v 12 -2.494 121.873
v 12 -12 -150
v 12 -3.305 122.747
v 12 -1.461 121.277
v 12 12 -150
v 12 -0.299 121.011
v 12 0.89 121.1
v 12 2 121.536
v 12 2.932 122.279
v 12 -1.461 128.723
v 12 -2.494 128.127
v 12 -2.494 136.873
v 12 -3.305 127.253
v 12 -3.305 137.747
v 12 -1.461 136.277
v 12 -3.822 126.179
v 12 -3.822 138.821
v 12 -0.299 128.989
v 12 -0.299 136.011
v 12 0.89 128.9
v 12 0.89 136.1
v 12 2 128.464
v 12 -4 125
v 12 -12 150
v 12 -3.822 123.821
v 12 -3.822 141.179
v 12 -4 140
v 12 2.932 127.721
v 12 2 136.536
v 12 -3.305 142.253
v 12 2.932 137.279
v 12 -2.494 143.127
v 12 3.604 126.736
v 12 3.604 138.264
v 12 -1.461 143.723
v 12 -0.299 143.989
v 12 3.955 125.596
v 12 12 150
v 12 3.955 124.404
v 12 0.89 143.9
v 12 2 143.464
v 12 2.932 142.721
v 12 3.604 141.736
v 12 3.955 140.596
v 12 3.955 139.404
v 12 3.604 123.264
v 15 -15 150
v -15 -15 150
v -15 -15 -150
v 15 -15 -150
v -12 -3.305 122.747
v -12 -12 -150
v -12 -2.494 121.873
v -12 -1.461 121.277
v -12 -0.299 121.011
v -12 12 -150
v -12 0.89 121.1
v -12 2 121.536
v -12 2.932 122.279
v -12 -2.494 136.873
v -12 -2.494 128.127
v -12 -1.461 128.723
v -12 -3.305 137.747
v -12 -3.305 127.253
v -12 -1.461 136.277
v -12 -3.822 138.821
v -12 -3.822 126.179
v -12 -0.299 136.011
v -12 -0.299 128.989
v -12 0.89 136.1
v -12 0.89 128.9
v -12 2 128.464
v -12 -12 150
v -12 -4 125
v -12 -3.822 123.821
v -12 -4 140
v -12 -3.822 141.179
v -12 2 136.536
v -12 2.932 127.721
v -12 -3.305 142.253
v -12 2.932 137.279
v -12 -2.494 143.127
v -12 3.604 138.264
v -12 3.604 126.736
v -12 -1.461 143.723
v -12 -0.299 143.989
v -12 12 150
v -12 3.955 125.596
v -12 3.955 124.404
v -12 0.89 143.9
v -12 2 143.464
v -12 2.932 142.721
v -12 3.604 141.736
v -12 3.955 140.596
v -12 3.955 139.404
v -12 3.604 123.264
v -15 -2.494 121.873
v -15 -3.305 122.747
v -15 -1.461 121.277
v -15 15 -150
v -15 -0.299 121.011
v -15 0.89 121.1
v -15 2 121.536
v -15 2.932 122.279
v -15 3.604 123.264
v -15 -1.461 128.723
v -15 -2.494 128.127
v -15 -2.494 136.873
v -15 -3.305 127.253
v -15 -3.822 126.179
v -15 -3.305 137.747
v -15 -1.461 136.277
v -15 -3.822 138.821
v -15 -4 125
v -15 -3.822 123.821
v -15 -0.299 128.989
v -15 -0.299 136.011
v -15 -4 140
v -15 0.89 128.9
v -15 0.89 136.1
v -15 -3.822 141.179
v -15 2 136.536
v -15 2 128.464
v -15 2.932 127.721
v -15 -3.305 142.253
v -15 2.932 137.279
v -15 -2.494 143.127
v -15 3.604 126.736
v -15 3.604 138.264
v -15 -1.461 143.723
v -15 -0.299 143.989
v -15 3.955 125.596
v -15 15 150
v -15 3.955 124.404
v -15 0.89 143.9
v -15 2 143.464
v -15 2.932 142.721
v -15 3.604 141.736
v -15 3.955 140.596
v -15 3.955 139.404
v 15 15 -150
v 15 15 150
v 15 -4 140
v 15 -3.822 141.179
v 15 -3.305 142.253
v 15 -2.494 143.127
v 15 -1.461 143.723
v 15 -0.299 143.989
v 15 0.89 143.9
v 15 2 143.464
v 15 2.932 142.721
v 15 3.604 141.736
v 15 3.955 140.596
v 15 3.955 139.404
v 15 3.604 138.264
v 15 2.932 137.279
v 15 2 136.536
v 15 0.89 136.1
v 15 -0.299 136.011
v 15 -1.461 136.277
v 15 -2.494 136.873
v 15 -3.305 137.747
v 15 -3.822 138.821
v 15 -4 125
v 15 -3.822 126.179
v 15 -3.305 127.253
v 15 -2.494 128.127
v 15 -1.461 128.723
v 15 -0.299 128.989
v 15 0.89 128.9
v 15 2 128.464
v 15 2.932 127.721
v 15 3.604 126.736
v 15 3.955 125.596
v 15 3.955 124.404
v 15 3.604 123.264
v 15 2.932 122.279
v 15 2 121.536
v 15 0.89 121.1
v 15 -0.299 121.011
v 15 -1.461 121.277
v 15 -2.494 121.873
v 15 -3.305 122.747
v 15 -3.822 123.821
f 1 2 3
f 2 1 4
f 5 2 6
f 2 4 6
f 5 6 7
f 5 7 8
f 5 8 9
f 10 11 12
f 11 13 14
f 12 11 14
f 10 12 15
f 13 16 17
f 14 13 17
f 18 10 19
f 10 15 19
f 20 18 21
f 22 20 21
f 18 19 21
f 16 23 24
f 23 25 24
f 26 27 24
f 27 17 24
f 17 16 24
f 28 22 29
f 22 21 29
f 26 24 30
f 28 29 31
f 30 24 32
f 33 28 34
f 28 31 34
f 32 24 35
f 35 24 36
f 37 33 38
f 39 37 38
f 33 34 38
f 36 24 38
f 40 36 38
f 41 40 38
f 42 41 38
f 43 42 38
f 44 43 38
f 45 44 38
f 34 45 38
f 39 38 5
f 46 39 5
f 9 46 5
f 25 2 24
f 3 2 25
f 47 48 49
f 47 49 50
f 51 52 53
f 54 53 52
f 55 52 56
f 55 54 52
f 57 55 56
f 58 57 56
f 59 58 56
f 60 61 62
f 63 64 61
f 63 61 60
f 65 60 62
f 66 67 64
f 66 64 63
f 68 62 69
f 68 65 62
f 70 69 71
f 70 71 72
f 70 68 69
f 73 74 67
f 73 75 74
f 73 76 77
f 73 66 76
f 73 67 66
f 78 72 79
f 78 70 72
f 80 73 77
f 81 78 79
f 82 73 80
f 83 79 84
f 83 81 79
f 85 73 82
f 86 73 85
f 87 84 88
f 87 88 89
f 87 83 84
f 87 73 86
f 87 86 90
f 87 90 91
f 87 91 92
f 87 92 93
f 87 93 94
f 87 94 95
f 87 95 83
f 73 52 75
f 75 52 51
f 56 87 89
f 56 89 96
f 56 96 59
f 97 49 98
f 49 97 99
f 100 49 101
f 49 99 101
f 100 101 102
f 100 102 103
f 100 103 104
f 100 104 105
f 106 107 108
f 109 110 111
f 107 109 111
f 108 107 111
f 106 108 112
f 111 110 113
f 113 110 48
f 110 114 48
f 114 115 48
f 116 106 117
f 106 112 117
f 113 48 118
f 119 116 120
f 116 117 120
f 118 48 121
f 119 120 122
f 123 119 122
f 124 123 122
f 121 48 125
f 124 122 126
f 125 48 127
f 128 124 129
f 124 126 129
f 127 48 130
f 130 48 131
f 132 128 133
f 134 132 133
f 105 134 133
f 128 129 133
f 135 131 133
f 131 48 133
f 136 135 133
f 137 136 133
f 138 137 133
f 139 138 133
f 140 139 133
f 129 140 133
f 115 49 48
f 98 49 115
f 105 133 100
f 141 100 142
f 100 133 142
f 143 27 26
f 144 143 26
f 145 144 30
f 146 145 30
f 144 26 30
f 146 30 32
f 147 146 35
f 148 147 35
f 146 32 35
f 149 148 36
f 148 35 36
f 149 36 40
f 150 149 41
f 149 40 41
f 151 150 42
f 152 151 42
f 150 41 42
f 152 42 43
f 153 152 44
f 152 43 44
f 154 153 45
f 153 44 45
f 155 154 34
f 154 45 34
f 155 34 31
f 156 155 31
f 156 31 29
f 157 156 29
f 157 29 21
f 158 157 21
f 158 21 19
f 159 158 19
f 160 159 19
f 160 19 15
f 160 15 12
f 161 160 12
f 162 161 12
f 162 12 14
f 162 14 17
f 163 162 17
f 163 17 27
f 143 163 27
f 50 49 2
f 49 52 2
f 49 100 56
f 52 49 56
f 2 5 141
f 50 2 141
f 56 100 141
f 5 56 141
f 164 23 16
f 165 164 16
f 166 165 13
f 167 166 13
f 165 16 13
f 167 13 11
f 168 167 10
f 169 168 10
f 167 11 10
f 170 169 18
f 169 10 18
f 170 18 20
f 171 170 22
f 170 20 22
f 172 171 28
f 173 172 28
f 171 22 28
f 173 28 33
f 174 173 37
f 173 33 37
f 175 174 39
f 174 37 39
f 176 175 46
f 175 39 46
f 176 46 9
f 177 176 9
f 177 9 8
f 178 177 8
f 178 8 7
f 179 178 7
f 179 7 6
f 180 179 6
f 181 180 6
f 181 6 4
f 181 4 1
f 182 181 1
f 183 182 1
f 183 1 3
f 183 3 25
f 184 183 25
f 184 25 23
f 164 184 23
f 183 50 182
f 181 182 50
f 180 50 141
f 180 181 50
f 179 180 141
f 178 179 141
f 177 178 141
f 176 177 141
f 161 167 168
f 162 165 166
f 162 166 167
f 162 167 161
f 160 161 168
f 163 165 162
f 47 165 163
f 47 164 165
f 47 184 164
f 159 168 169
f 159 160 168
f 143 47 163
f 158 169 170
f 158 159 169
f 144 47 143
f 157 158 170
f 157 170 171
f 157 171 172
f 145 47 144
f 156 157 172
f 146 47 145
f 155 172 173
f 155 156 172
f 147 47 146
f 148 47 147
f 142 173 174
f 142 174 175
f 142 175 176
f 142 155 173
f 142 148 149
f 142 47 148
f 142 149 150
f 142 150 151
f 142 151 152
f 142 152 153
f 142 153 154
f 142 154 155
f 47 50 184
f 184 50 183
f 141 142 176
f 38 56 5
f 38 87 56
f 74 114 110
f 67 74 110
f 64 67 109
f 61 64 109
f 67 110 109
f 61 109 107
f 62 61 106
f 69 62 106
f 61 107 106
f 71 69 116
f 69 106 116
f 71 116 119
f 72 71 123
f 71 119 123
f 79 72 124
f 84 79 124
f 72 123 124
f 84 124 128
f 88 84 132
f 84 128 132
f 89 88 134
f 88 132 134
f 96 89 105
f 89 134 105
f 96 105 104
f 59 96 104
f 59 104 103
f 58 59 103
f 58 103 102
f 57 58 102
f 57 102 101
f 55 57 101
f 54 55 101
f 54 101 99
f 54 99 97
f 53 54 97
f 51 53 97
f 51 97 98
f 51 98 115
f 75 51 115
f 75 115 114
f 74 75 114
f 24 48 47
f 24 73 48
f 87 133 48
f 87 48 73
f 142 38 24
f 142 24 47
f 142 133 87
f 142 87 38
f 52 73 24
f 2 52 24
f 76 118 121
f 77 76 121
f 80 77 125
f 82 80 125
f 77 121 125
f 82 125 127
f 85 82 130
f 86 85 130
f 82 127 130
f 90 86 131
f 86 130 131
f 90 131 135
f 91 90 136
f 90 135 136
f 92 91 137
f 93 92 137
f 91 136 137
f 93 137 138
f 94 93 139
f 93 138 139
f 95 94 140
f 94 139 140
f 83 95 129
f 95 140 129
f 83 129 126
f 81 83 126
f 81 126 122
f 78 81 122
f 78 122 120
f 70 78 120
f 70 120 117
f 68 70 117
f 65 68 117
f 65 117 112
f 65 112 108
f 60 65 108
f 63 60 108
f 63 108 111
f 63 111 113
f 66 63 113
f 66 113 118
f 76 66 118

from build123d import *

# Parameters (mm, degrees)
F0_W     = 30
F0_H     = 30
F0_W_2   = 24
F0_H_2   = 24
F1_DEPTH = 150
F3_D     = 8


with BuildPart() as f1:
    # F0 (on Top) → F1 (new body, symmetric)
    with BuildSketch(Plane.XY):
        Rectangle(F0_W, F0_H)
        Rectangle(F0_W_2, F0_H_2, mode=Mode.SUBTRACT)
    extrude(amount=F1_DEPTH, both=True)

    # F3 (through all)
    with Locations(Plane.YZ.offset(15)):
        with Locations((0, 140), (0, 125)):
            Hole(F3_D / 2)


solid = f1.part
